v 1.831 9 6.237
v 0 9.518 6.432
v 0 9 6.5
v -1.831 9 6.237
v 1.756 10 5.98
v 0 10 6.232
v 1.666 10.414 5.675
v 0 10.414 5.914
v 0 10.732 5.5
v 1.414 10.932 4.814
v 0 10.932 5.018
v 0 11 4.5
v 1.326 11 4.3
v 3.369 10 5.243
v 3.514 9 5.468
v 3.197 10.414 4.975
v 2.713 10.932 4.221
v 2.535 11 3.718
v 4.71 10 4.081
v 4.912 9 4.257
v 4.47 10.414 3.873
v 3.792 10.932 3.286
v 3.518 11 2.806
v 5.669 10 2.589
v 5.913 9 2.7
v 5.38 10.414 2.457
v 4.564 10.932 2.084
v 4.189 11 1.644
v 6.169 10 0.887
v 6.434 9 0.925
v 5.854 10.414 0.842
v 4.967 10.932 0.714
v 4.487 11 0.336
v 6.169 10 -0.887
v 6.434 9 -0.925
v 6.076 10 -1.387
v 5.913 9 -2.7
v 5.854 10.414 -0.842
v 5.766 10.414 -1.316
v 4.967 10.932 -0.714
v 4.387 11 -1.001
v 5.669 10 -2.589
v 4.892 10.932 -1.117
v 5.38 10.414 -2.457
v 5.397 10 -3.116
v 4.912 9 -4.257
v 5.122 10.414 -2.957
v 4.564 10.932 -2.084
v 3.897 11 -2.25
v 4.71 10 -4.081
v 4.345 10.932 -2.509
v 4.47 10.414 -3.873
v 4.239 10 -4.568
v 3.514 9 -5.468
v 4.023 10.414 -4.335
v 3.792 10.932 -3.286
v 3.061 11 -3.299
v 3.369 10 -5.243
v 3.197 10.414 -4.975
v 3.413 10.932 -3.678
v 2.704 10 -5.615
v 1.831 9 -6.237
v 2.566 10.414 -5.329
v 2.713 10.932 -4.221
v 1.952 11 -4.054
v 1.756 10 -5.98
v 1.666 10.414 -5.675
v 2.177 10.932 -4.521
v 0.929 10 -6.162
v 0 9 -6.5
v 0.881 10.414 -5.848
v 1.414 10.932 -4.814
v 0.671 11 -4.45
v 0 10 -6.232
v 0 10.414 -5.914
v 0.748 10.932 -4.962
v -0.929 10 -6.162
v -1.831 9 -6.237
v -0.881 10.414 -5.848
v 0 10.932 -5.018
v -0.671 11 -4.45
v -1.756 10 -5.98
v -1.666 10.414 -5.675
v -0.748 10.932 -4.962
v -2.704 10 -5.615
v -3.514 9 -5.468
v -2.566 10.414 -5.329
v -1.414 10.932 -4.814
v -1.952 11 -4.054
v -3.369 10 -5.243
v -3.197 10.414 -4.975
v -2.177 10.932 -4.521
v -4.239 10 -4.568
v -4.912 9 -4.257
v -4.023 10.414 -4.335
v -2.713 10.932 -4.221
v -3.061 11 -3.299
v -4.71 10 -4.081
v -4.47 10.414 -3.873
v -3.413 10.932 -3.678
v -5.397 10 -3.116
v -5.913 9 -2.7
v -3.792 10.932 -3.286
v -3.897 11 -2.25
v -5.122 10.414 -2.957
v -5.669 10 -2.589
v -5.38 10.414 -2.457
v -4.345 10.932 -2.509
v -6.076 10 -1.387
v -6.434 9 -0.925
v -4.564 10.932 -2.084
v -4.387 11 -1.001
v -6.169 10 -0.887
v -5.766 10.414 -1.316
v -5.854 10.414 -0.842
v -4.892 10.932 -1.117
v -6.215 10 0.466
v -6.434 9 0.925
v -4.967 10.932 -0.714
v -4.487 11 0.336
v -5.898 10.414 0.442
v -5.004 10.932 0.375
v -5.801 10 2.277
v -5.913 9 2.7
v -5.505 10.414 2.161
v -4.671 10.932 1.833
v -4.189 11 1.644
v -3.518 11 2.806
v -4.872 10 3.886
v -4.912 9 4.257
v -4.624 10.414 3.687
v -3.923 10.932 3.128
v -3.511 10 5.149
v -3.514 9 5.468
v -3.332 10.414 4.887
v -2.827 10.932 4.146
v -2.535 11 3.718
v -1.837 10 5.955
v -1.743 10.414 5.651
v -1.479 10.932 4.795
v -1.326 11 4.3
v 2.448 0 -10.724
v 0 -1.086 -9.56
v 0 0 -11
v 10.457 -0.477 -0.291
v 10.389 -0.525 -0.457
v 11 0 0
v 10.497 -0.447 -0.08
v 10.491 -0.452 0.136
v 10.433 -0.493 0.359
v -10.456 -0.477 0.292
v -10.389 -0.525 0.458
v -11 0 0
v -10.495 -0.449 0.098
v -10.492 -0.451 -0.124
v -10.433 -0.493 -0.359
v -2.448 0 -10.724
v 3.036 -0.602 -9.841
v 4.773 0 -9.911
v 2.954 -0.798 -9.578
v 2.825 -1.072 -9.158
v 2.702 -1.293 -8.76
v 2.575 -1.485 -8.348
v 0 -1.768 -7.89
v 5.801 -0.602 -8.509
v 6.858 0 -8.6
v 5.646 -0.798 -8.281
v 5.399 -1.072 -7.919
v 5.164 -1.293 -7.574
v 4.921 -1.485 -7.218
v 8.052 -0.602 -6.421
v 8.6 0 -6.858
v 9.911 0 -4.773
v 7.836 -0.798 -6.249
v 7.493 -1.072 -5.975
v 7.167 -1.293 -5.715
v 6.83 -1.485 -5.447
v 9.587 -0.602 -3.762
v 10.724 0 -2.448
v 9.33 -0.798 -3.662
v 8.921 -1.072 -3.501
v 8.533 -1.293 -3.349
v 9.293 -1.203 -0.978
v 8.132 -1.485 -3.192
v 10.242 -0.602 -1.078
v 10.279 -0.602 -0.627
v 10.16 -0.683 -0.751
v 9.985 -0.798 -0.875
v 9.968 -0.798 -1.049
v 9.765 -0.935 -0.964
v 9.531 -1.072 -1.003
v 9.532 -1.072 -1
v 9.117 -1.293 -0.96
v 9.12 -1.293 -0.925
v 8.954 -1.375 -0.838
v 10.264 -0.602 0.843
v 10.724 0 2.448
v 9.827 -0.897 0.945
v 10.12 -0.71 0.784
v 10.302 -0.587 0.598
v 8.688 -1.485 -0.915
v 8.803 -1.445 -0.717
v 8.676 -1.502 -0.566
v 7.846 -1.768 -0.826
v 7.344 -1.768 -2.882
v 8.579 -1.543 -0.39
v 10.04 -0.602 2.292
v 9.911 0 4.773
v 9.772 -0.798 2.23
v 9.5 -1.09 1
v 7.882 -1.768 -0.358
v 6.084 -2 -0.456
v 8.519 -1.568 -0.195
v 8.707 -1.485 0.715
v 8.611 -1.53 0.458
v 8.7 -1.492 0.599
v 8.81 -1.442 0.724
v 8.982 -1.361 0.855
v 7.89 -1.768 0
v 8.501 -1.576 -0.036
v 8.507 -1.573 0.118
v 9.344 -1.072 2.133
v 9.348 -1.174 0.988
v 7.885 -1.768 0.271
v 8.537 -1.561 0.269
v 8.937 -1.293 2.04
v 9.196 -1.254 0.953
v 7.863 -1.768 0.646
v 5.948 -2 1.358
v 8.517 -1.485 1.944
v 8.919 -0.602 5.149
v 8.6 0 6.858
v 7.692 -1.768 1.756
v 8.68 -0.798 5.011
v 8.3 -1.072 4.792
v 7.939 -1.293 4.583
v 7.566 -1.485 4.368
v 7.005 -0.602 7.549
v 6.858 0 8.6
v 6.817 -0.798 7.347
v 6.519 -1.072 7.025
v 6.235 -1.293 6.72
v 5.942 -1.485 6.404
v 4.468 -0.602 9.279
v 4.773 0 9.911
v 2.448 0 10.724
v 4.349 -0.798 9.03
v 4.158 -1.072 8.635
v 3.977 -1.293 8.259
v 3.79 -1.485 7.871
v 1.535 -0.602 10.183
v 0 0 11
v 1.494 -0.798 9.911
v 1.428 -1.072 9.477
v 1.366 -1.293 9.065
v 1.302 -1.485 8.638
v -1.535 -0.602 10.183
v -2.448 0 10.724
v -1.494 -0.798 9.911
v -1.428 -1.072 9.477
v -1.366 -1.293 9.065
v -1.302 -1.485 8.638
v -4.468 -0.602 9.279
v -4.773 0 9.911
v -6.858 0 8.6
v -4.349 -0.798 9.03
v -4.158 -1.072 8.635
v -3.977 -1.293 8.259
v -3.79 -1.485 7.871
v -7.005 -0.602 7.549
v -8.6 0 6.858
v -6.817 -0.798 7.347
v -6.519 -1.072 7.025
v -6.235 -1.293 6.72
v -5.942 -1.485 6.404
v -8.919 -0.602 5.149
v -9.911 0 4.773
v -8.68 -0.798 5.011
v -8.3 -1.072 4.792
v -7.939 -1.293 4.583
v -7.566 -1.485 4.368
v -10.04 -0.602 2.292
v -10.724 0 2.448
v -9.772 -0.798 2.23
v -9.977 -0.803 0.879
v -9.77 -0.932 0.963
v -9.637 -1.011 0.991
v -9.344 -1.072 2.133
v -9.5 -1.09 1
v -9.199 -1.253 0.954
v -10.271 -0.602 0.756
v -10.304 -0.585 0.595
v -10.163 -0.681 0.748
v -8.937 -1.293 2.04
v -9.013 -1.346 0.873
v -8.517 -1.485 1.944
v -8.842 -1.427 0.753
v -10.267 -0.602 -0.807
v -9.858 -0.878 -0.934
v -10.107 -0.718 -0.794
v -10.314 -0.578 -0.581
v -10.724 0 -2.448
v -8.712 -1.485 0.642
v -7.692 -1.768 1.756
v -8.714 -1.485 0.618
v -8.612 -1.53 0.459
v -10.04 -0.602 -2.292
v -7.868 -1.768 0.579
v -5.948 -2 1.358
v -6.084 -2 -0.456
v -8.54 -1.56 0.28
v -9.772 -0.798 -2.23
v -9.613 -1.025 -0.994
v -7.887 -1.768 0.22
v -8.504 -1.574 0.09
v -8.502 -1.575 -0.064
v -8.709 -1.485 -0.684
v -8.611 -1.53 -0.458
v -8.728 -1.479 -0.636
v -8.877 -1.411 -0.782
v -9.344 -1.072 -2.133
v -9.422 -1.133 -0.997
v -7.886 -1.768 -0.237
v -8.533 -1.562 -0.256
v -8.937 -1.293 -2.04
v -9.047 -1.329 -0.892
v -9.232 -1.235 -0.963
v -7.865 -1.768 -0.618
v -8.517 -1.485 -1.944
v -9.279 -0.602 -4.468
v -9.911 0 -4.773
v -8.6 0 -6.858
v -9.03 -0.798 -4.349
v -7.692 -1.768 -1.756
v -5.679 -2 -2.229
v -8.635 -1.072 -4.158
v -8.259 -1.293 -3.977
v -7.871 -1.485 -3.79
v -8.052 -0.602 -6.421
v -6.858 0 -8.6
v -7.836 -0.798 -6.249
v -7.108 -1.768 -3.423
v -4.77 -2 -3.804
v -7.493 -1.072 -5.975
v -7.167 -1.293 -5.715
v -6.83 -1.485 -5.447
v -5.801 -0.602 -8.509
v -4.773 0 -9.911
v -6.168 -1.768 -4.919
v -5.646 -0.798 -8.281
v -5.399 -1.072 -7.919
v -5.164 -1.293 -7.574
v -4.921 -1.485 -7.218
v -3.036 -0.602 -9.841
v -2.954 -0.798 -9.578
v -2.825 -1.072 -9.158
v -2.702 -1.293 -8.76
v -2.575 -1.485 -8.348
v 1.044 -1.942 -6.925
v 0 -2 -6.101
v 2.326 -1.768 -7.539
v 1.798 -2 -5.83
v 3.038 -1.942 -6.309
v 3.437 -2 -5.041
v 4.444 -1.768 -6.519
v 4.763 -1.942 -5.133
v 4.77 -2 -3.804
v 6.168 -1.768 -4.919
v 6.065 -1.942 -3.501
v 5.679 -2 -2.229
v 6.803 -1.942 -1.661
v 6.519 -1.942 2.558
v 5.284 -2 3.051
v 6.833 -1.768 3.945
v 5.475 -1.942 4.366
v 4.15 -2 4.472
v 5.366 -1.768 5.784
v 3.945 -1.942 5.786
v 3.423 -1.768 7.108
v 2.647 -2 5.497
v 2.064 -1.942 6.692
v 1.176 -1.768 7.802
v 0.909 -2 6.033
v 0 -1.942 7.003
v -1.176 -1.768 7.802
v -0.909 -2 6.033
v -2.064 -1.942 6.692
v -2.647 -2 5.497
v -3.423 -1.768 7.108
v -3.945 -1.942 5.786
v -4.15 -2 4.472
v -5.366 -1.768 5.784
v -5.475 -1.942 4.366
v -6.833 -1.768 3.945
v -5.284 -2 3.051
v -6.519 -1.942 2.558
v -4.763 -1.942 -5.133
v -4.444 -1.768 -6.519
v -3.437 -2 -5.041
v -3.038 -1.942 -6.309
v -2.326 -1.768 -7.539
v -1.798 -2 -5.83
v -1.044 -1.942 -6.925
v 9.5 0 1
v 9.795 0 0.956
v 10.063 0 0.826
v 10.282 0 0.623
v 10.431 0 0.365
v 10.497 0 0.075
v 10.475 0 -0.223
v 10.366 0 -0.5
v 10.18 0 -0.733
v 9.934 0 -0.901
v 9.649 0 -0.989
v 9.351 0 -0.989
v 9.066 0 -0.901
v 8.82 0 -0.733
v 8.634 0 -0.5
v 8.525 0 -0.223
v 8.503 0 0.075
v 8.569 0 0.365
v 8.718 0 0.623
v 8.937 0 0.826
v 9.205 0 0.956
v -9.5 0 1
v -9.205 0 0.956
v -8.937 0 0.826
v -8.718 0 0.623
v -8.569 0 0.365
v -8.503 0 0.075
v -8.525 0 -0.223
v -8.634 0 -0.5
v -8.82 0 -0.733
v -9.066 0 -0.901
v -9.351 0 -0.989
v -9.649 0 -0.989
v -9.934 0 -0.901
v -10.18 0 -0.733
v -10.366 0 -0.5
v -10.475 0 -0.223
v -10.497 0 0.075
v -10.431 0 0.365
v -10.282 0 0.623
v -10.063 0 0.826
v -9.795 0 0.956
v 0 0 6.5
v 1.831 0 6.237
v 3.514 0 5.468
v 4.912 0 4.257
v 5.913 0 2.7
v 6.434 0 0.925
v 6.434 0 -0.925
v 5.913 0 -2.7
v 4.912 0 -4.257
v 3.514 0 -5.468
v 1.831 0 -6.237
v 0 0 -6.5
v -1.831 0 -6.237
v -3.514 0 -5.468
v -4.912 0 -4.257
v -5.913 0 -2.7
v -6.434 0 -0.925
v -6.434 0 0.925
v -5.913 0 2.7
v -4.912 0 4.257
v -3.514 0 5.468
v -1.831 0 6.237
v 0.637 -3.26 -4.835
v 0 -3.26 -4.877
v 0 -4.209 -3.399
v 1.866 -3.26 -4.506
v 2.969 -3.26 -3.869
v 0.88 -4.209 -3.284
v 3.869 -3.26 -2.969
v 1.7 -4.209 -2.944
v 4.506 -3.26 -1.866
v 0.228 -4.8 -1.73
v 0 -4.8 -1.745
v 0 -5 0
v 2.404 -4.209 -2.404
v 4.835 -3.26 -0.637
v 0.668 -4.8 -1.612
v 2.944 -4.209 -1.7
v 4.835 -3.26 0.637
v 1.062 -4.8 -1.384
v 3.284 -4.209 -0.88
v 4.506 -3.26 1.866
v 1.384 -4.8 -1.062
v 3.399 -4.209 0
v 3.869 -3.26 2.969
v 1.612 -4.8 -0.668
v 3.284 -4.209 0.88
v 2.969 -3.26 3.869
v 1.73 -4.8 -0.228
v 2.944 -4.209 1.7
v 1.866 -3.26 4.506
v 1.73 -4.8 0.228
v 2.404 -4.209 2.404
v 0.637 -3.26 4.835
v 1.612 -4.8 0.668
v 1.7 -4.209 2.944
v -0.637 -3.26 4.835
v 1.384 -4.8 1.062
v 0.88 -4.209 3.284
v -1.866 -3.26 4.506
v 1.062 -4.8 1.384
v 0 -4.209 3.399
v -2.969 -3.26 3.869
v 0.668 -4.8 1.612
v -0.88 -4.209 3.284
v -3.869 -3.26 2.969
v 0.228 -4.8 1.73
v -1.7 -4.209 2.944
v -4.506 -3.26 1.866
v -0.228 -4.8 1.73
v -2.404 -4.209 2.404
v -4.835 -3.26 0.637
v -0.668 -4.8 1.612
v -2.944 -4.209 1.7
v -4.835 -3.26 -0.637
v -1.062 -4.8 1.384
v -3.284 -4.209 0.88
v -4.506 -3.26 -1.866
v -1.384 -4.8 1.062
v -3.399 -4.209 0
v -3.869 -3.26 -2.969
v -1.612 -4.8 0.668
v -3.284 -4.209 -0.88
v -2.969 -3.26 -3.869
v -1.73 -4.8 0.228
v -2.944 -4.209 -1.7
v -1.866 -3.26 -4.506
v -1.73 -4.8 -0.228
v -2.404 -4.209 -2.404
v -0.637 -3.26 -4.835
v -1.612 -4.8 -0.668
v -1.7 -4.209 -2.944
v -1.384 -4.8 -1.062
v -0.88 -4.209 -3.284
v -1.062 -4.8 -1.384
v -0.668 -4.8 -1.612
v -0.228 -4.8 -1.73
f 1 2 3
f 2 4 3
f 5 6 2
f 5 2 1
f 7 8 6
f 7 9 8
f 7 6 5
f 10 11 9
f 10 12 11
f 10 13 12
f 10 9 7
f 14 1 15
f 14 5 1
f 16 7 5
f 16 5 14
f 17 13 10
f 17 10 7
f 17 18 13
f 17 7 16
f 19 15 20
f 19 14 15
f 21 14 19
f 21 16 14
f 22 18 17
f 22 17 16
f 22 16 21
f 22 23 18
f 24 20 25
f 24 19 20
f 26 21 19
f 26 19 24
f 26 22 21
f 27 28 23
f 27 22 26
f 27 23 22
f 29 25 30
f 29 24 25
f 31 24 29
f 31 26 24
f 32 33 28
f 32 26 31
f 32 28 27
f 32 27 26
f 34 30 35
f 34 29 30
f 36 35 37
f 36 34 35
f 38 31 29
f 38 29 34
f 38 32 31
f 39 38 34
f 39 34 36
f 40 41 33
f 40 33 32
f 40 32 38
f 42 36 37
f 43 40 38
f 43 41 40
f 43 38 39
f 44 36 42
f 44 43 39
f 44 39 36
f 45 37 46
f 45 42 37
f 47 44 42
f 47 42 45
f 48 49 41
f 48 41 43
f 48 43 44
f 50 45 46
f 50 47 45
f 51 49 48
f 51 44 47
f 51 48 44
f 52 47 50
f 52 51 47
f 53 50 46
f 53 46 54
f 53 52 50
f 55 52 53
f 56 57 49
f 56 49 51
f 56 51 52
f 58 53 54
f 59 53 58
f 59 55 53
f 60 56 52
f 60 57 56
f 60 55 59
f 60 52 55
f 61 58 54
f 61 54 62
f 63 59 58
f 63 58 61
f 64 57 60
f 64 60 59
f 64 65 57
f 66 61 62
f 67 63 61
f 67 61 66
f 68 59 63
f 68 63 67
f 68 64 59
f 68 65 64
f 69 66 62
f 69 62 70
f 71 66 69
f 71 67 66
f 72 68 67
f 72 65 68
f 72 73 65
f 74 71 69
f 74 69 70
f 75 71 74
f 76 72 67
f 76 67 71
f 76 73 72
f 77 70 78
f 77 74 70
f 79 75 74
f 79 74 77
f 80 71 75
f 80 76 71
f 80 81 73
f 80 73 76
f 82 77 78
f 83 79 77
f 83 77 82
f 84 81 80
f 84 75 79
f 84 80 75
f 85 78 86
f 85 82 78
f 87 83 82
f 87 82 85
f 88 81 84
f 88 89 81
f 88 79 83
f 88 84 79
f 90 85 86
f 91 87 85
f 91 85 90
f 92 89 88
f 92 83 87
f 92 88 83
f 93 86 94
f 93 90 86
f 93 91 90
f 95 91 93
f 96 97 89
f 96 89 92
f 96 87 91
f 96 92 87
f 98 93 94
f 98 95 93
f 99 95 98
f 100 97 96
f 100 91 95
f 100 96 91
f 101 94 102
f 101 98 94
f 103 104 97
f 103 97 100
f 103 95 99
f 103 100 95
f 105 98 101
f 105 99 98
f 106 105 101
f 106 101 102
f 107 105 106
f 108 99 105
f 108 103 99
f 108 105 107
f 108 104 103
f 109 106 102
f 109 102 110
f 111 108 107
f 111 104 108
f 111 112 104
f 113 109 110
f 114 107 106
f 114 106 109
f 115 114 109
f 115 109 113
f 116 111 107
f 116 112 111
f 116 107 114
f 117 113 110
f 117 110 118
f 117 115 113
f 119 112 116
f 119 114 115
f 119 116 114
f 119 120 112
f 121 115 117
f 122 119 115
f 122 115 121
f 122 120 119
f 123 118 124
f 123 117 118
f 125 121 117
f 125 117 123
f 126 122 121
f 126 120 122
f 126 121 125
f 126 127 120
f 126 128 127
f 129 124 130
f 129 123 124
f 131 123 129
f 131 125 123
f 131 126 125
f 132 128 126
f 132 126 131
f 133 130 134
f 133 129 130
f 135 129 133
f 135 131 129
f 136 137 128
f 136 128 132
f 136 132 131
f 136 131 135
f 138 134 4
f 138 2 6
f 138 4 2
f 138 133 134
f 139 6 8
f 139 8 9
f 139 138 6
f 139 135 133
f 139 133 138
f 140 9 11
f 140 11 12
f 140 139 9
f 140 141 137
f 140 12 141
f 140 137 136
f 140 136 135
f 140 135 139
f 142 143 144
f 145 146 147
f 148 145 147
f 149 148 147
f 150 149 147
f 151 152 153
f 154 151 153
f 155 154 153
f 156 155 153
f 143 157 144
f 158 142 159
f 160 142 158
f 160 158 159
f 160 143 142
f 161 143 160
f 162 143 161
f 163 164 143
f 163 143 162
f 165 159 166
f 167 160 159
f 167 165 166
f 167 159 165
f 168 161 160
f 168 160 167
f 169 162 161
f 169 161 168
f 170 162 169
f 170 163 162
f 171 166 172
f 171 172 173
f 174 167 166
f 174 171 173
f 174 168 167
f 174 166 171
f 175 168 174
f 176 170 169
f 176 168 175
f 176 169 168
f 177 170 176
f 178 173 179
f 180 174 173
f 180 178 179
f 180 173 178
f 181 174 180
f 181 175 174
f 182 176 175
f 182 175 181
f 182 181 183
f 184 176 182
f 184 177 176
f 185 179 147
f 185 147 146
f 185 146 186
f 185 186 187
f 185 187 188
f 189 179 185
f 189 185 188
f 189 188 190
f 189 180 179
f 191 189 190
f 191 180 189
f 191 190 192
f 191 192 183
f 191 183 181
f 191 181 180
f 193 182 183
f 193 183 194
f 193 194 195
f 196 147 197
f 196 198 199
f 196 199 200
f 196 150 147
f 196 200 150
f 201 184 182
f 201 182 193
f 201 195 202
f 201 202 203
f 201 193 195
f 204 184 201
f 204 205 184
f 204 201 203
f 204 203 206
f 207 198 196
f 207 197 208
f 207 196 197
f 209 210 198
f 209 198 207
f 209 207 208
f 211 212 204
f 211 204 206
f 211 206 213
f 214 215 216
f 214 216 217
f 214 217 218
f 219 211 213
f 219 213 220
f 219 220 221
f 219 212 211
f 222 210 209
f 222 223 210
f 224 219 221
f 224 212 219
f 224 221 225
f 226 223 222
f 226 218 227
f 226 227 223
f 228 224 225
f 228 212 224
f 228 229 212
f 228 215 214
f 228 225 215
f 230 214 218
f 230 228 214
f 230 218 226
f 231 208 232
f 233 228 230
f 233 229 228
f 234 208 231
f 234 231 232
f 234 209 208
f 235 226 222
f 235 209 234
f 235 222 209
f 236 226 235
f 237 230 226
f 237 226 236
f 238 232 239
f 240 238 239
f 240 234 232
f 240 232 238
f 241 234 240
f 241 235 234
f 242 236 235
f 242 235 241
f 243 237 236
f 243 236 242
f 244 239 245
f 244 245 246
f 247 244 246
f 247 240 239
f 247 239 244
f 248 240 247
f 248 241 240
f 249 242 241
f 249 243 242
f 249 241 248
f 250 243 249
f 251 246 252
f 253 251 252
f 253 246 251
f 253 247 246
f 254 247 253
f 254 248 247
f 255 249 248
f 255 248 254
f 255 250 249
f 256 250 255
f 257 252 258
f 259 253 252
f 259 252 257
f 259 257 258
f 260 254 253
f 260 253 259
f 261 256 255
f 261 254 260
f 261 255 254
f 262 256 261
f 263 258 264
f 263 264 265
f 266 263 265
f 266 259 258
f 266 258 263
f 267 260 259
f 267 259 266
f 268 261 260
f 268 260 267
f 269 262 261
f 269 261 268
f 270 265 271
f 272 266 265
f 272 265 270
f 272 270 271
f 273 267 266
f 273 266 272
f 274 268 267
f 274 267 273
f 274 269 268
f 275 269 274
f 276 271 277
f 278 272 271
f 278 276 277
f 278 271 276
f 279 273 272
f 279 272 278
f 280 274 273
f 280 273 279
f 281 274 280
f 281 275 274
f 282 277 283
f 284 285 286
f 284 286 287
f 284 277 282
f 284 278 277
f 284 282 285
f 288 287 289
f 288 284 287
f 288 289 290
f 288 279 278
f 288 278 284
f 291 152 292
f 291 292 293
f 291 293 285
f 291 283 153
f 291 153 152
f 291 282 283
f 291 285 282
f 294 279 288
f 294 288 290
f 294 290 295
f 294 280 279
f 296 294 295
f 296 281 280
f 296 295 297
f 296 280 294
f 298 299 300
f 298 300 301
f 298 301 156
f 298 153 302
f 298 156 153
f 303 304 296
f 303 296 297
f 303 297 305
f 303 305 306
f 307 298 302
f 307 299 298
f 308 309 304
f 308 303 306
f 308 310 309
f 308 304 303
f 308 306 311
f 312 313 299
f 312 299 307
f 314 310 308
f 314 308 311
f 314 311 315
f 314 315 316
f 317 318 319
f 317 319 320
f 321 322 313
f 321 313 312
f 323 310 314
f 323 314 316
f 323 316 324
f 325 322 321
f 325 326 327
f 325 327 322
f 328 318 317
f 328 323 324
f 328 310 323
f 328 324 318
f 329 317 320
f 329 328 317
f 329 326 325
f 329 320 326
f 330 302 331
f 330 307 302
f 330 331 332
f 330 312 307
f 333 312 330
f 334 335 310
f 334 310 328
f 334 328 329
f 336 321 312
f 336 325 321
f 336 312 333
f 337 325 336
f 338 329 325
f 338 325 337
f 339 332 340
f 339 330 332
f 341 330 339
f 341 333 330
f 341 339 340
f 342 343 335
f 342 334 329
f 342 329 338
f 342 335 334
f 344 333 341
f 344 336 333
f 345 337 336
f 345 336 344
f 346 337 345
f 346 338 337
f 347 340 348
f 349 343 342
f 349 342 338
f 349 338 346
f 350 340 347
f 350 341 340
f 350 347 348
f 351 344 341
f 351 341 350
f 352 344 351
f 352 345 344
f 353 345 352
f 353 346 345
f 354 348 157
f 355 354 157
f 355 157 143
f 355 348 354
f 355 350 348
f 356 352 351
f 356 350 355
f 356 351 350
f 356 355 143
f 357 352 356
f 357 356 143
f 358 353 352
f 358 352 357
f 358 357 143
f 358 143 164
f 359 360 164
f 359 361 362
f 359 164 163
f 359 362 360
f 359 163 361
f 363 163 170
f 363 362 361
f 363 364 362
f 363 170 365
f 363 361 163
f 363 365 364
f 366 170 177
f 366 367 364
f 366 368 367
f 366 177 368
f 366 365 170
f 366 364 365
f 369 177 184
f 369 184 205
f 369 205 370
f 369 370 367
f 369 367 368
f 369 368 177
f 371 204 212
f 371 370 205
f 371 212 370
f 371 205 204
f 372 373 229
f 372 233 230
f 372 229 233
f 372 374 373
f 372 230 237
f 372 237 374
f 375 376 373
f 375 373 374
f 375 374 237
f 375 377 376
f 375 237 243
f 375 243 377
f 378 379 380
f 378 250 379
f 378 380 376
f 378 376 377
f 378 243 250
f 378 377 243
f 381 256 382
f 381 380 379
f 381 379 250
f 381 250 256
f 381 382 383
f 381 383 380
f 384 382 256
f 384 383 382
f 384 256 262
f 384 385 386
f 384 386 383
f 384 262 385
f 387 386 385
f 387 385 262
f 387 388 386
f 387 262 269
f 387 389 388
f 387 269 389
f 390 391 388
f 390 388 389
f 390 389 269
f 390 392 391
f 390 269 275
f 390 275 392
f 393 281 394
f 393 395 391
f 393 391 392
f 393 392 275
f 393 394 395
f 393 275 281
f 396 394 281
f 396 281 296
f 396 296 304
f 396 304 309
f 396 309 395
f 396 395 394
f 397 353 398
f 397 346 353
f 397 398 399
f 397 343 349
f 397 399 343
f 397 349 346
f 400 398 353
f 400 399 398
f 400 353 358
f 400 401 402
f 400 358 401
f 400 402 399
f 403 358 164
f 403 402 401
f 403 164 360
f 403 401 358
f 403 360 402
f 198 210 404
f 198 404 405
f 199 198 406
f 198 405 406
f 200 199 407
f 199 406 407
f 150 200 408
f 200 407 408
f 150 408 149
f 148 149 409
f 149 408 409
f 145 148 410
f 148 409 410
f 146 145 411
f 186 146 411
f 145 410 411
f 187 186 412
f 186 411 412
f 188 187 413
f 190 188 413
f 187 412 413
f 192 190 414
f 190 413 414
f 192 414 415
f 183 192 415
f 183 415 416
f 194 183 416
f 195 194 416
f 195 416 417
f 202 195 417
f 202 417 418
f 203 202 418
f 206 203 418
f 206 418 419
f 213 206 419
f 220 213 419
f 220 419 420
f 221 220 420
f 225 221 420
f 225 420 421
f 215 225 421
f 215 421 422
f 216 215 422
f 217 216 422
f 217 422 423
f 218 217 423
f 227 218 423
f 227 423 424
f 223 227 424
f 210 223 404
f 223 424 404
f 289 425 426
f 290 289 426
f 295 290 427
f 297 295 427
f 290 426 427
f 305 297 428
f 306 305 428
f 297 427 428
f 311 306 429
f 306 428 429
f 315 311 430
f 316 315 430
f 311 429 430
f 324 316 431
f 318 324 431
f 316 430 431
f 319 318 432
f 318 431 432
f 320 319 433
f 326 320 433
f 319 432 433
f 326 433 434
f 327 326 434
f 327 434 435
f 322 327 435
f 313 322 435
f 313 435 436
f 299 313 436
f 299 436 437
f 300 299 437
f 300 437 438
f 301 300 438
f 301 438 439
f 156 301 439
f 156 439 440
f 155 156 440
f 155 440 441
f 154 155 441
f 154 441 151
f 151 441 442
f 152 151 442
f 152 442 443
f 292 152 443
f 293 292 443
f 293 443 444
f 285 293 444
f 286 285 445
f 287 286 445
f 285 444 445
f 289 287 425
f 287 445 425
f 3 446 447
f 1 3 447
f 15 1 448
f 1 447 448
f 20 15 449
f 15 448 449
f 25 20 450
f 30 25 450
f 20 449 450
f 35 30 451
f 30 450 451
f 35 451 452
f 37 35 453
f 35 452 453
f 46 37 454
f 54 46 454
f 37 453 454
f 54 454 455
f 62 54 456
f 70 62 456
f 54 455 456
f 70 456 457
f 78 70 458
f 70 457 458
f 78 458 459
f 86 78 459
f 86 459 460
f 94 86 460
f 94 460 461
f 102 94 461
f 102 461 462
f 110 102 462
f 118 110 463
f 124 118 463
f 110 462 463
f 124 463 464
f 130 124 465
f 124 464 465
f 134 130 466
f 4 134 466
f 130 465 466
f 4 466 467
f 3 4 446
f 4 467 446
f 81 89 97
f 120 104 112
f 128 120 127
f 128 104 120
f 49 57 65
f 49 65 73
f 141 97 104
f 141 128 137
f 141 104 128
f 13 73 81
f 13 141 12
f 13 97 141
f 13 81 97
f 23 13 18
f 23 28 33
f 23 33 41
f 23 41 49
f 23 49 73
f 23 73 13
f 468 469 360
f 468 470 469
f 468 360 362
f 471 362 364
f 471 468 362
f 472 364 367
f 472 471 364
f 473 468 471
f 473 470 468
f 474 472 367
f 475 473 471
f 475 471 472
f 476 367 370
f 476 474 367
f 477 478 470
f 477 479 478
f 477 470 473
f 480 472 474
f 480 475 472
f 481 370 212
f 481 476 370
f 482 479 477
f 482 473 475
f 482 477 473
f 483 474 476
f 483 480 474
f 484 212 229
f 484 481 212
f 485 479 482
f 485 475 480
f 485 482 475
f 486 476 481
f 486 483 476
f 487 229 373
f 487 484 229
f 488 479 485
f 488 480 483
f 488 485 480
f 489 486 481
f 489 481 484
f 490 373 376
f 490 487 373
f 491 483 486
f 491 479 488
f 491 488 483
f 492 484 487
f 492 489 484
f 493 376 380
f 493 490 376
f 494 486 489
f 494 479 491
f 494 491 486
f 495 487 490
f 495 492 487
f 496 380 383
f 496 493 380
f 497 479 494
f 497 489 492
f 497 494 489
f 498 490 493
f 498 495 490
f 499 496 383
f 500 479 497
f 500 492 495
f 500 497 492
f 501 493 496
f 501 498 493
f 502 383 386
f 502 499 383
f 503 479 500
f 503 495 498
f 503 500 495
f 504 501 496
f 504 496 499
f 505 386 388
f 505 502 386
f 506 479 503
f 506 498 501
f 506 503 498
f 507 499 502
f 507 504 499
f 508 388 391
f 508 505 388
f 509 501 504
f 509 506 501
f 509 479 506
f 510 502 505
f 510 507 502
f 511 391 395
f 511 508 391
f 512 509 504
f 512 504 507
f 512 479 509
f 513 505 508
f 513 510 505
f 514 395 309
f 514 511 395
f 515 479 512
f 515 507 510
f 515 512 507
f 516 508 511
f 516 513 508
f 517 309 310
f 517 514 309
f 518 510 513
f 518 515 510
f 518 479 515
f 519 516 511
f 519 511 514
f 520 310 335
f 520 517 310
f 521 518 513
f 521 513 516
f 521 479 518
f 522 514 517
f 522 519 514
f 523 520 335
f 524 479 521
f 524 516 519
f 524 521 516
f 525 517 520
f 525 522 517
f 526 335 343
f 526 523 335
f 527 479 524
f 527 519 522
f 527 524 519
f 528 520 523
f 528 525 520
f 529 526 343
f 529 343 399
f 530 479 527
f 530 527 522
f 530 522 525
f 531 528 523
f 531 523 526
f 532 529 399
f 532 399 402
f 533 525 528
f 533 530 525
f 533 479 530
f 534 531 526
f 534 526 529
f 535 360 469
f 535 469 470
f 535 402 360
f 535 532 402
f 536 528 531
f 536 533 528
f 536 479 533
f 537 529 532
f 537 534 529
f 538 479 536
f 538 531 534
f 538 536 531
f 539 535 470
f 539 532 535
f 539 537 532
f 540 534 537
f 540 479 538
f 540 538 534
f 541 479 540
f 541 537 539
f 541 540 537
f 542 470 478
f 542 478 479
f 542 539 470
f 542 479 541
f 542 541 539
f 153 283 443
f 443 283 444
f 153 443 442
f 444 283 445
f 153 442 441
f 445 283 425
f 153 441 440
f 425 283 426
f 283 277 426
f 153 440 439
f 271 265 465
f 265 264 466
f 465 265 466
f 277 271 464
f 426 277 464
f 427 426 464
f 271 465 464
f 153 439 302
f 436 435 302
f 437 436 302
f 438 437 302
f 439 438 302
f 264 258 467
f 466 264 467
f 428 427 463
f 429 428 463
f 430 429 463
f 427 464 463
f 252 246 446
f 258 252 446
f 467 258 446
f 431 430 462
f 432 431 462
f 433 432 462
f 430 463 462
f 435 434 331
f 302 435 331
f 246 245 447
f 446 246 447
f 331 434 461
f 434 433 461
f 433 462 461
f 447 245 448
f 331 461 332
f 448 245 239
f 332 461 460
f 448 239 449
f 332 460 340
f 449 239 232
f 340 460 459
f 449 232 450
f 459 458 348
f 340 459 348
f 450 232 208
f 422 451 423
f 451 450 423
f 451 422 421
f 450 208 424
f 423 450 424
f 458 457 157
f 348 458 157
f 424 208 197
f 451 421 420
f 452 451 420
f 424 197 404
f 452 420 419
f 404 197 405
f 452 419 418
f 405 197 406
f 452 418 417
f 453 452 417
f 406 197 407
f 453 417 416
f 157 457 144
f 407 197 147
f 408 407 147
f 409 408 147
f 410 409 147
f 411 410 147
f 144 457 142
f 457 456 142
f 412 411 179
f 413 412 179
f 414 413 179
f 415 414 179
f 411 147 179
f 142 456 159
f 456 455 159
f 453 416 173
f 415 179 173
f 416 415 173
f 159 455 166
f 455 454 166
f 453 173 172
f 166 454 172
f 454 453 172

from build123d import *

# Parameters (mm, degrees)
SKETCH1_R           = 6.5
BOSS_EXTRUDE1_DEPTH = 11
SKETCH2_R           = 11
BOSS_EXTRUDE2_DEPTH = 2
FILLET1_R           = 7
DOME1_FACE_RADIUS   = 6.101020514
DOME1_HEIGHT        = 3
SKETCH3_R           = 1
CUT_EXTRUDE1_DEPTH  = 2
FILLET2_R           = 2


with BuildPart() as part:
    # Sketch1 → Boss-Extrude1 (new body)
    with BuildSketch(Plane(origin=(0, 0, 0), x_dir=(1, 0, 0), z_dir=(0, 1, 0))):
        with Locations(Location((0, 0, 0), (0, 0, 270))):
            Circle(SKETCH1_R)
    extrude(amount=BOSS_EXTRUDE1_DEPTH)

    # Sketch2 → Boss-Extrude2 (add)
    with BuildSketch(Plane.XZ):
        with Locations(Location((0, 0, 0), (0, 0, 270))):
            Circle(SKETCH2_R)
    extrude(amount=BOSS_EXTRUDE2_DEPTH)

    # Fillet1
    # the kernel refuses this fillet: 7 mm, written as the material it takes off along each edge
    with BuildSketch(Plane(origin=(0, -2, 0), x_dir=(0, 0, -1), z_dir=(-1, 0, 0))) as fillet1_piece_1:
        with BuildLine():
            CenterArc((6.101020514, -7), FILLET1_R, 45.584691403, 44.415308597)
            Line((6.101020514, 0), (6.101020514, 0.14))
            Line((6.101020514, 0.14), (11, 0.14))
            Line((11, 0.14), (11.14, 0))
            ThreePointArc((11.14, 0), (11.14, -1), (11.09797959, -1.9))
            Line((11.09797959, -1.9), (11, -2))
        make_face()
    revolve(axis=Axis((0, -2, 0), (0, -1, 0)), mode=Mode.SUBTRACT)

    # Dome1: a dome of height H over a round flat face of radius A is a cap of a sphere of radius (A * A + H * H) / (2 * H)
    dome1_r = (DOME1_FACE_RADIUS * DOME1_FACE_RADIUS + DOME1_HEIGHT * DOME1_HEIGHT) / (2 * DOME1_HEIGHT)
    dome1_base = Plane((0, -2, 0), z_dir=(0, -1, 0))
    with Locations(dome1_base.offset(DOME1_HEIGHT - dome1_r)):
        dome1_ball = Sphere(dome1_r, mode=Mode.PRIVATE)
    add(split(dome1_ball, bisect_by=dome1_base, keep=Keep.TOP, mode=Mode.PRIVATE))

    # Sketch3 → Cut-Extrude1 (cut)
    with BuildSketch(Plane(origin=(0, 0, 0), x_dir=(1, 0, 0), z_dir=(0, 1, 0))):
        with Locations(Location((-9.5, 0, 0), (0, 0, 270))):
            Circle(SKETCH3_R)
        with Locations(Location((9.5, 0, 0), (0, 0, 270))):
            Circle(SKETCH3_R)
    extrude(amount=-CUT_EXTRUDE1_DEPTH, mode=Mode.SUBTRACT)

    # Fillet2
    fillet2_edges = [part.edges().sort_by_distance(p)[0] for p in [
        (0, 11, -6.5),
    ]]
    fillet(fillet2_edges, radius=FILLET2_R)


solid = part.part
